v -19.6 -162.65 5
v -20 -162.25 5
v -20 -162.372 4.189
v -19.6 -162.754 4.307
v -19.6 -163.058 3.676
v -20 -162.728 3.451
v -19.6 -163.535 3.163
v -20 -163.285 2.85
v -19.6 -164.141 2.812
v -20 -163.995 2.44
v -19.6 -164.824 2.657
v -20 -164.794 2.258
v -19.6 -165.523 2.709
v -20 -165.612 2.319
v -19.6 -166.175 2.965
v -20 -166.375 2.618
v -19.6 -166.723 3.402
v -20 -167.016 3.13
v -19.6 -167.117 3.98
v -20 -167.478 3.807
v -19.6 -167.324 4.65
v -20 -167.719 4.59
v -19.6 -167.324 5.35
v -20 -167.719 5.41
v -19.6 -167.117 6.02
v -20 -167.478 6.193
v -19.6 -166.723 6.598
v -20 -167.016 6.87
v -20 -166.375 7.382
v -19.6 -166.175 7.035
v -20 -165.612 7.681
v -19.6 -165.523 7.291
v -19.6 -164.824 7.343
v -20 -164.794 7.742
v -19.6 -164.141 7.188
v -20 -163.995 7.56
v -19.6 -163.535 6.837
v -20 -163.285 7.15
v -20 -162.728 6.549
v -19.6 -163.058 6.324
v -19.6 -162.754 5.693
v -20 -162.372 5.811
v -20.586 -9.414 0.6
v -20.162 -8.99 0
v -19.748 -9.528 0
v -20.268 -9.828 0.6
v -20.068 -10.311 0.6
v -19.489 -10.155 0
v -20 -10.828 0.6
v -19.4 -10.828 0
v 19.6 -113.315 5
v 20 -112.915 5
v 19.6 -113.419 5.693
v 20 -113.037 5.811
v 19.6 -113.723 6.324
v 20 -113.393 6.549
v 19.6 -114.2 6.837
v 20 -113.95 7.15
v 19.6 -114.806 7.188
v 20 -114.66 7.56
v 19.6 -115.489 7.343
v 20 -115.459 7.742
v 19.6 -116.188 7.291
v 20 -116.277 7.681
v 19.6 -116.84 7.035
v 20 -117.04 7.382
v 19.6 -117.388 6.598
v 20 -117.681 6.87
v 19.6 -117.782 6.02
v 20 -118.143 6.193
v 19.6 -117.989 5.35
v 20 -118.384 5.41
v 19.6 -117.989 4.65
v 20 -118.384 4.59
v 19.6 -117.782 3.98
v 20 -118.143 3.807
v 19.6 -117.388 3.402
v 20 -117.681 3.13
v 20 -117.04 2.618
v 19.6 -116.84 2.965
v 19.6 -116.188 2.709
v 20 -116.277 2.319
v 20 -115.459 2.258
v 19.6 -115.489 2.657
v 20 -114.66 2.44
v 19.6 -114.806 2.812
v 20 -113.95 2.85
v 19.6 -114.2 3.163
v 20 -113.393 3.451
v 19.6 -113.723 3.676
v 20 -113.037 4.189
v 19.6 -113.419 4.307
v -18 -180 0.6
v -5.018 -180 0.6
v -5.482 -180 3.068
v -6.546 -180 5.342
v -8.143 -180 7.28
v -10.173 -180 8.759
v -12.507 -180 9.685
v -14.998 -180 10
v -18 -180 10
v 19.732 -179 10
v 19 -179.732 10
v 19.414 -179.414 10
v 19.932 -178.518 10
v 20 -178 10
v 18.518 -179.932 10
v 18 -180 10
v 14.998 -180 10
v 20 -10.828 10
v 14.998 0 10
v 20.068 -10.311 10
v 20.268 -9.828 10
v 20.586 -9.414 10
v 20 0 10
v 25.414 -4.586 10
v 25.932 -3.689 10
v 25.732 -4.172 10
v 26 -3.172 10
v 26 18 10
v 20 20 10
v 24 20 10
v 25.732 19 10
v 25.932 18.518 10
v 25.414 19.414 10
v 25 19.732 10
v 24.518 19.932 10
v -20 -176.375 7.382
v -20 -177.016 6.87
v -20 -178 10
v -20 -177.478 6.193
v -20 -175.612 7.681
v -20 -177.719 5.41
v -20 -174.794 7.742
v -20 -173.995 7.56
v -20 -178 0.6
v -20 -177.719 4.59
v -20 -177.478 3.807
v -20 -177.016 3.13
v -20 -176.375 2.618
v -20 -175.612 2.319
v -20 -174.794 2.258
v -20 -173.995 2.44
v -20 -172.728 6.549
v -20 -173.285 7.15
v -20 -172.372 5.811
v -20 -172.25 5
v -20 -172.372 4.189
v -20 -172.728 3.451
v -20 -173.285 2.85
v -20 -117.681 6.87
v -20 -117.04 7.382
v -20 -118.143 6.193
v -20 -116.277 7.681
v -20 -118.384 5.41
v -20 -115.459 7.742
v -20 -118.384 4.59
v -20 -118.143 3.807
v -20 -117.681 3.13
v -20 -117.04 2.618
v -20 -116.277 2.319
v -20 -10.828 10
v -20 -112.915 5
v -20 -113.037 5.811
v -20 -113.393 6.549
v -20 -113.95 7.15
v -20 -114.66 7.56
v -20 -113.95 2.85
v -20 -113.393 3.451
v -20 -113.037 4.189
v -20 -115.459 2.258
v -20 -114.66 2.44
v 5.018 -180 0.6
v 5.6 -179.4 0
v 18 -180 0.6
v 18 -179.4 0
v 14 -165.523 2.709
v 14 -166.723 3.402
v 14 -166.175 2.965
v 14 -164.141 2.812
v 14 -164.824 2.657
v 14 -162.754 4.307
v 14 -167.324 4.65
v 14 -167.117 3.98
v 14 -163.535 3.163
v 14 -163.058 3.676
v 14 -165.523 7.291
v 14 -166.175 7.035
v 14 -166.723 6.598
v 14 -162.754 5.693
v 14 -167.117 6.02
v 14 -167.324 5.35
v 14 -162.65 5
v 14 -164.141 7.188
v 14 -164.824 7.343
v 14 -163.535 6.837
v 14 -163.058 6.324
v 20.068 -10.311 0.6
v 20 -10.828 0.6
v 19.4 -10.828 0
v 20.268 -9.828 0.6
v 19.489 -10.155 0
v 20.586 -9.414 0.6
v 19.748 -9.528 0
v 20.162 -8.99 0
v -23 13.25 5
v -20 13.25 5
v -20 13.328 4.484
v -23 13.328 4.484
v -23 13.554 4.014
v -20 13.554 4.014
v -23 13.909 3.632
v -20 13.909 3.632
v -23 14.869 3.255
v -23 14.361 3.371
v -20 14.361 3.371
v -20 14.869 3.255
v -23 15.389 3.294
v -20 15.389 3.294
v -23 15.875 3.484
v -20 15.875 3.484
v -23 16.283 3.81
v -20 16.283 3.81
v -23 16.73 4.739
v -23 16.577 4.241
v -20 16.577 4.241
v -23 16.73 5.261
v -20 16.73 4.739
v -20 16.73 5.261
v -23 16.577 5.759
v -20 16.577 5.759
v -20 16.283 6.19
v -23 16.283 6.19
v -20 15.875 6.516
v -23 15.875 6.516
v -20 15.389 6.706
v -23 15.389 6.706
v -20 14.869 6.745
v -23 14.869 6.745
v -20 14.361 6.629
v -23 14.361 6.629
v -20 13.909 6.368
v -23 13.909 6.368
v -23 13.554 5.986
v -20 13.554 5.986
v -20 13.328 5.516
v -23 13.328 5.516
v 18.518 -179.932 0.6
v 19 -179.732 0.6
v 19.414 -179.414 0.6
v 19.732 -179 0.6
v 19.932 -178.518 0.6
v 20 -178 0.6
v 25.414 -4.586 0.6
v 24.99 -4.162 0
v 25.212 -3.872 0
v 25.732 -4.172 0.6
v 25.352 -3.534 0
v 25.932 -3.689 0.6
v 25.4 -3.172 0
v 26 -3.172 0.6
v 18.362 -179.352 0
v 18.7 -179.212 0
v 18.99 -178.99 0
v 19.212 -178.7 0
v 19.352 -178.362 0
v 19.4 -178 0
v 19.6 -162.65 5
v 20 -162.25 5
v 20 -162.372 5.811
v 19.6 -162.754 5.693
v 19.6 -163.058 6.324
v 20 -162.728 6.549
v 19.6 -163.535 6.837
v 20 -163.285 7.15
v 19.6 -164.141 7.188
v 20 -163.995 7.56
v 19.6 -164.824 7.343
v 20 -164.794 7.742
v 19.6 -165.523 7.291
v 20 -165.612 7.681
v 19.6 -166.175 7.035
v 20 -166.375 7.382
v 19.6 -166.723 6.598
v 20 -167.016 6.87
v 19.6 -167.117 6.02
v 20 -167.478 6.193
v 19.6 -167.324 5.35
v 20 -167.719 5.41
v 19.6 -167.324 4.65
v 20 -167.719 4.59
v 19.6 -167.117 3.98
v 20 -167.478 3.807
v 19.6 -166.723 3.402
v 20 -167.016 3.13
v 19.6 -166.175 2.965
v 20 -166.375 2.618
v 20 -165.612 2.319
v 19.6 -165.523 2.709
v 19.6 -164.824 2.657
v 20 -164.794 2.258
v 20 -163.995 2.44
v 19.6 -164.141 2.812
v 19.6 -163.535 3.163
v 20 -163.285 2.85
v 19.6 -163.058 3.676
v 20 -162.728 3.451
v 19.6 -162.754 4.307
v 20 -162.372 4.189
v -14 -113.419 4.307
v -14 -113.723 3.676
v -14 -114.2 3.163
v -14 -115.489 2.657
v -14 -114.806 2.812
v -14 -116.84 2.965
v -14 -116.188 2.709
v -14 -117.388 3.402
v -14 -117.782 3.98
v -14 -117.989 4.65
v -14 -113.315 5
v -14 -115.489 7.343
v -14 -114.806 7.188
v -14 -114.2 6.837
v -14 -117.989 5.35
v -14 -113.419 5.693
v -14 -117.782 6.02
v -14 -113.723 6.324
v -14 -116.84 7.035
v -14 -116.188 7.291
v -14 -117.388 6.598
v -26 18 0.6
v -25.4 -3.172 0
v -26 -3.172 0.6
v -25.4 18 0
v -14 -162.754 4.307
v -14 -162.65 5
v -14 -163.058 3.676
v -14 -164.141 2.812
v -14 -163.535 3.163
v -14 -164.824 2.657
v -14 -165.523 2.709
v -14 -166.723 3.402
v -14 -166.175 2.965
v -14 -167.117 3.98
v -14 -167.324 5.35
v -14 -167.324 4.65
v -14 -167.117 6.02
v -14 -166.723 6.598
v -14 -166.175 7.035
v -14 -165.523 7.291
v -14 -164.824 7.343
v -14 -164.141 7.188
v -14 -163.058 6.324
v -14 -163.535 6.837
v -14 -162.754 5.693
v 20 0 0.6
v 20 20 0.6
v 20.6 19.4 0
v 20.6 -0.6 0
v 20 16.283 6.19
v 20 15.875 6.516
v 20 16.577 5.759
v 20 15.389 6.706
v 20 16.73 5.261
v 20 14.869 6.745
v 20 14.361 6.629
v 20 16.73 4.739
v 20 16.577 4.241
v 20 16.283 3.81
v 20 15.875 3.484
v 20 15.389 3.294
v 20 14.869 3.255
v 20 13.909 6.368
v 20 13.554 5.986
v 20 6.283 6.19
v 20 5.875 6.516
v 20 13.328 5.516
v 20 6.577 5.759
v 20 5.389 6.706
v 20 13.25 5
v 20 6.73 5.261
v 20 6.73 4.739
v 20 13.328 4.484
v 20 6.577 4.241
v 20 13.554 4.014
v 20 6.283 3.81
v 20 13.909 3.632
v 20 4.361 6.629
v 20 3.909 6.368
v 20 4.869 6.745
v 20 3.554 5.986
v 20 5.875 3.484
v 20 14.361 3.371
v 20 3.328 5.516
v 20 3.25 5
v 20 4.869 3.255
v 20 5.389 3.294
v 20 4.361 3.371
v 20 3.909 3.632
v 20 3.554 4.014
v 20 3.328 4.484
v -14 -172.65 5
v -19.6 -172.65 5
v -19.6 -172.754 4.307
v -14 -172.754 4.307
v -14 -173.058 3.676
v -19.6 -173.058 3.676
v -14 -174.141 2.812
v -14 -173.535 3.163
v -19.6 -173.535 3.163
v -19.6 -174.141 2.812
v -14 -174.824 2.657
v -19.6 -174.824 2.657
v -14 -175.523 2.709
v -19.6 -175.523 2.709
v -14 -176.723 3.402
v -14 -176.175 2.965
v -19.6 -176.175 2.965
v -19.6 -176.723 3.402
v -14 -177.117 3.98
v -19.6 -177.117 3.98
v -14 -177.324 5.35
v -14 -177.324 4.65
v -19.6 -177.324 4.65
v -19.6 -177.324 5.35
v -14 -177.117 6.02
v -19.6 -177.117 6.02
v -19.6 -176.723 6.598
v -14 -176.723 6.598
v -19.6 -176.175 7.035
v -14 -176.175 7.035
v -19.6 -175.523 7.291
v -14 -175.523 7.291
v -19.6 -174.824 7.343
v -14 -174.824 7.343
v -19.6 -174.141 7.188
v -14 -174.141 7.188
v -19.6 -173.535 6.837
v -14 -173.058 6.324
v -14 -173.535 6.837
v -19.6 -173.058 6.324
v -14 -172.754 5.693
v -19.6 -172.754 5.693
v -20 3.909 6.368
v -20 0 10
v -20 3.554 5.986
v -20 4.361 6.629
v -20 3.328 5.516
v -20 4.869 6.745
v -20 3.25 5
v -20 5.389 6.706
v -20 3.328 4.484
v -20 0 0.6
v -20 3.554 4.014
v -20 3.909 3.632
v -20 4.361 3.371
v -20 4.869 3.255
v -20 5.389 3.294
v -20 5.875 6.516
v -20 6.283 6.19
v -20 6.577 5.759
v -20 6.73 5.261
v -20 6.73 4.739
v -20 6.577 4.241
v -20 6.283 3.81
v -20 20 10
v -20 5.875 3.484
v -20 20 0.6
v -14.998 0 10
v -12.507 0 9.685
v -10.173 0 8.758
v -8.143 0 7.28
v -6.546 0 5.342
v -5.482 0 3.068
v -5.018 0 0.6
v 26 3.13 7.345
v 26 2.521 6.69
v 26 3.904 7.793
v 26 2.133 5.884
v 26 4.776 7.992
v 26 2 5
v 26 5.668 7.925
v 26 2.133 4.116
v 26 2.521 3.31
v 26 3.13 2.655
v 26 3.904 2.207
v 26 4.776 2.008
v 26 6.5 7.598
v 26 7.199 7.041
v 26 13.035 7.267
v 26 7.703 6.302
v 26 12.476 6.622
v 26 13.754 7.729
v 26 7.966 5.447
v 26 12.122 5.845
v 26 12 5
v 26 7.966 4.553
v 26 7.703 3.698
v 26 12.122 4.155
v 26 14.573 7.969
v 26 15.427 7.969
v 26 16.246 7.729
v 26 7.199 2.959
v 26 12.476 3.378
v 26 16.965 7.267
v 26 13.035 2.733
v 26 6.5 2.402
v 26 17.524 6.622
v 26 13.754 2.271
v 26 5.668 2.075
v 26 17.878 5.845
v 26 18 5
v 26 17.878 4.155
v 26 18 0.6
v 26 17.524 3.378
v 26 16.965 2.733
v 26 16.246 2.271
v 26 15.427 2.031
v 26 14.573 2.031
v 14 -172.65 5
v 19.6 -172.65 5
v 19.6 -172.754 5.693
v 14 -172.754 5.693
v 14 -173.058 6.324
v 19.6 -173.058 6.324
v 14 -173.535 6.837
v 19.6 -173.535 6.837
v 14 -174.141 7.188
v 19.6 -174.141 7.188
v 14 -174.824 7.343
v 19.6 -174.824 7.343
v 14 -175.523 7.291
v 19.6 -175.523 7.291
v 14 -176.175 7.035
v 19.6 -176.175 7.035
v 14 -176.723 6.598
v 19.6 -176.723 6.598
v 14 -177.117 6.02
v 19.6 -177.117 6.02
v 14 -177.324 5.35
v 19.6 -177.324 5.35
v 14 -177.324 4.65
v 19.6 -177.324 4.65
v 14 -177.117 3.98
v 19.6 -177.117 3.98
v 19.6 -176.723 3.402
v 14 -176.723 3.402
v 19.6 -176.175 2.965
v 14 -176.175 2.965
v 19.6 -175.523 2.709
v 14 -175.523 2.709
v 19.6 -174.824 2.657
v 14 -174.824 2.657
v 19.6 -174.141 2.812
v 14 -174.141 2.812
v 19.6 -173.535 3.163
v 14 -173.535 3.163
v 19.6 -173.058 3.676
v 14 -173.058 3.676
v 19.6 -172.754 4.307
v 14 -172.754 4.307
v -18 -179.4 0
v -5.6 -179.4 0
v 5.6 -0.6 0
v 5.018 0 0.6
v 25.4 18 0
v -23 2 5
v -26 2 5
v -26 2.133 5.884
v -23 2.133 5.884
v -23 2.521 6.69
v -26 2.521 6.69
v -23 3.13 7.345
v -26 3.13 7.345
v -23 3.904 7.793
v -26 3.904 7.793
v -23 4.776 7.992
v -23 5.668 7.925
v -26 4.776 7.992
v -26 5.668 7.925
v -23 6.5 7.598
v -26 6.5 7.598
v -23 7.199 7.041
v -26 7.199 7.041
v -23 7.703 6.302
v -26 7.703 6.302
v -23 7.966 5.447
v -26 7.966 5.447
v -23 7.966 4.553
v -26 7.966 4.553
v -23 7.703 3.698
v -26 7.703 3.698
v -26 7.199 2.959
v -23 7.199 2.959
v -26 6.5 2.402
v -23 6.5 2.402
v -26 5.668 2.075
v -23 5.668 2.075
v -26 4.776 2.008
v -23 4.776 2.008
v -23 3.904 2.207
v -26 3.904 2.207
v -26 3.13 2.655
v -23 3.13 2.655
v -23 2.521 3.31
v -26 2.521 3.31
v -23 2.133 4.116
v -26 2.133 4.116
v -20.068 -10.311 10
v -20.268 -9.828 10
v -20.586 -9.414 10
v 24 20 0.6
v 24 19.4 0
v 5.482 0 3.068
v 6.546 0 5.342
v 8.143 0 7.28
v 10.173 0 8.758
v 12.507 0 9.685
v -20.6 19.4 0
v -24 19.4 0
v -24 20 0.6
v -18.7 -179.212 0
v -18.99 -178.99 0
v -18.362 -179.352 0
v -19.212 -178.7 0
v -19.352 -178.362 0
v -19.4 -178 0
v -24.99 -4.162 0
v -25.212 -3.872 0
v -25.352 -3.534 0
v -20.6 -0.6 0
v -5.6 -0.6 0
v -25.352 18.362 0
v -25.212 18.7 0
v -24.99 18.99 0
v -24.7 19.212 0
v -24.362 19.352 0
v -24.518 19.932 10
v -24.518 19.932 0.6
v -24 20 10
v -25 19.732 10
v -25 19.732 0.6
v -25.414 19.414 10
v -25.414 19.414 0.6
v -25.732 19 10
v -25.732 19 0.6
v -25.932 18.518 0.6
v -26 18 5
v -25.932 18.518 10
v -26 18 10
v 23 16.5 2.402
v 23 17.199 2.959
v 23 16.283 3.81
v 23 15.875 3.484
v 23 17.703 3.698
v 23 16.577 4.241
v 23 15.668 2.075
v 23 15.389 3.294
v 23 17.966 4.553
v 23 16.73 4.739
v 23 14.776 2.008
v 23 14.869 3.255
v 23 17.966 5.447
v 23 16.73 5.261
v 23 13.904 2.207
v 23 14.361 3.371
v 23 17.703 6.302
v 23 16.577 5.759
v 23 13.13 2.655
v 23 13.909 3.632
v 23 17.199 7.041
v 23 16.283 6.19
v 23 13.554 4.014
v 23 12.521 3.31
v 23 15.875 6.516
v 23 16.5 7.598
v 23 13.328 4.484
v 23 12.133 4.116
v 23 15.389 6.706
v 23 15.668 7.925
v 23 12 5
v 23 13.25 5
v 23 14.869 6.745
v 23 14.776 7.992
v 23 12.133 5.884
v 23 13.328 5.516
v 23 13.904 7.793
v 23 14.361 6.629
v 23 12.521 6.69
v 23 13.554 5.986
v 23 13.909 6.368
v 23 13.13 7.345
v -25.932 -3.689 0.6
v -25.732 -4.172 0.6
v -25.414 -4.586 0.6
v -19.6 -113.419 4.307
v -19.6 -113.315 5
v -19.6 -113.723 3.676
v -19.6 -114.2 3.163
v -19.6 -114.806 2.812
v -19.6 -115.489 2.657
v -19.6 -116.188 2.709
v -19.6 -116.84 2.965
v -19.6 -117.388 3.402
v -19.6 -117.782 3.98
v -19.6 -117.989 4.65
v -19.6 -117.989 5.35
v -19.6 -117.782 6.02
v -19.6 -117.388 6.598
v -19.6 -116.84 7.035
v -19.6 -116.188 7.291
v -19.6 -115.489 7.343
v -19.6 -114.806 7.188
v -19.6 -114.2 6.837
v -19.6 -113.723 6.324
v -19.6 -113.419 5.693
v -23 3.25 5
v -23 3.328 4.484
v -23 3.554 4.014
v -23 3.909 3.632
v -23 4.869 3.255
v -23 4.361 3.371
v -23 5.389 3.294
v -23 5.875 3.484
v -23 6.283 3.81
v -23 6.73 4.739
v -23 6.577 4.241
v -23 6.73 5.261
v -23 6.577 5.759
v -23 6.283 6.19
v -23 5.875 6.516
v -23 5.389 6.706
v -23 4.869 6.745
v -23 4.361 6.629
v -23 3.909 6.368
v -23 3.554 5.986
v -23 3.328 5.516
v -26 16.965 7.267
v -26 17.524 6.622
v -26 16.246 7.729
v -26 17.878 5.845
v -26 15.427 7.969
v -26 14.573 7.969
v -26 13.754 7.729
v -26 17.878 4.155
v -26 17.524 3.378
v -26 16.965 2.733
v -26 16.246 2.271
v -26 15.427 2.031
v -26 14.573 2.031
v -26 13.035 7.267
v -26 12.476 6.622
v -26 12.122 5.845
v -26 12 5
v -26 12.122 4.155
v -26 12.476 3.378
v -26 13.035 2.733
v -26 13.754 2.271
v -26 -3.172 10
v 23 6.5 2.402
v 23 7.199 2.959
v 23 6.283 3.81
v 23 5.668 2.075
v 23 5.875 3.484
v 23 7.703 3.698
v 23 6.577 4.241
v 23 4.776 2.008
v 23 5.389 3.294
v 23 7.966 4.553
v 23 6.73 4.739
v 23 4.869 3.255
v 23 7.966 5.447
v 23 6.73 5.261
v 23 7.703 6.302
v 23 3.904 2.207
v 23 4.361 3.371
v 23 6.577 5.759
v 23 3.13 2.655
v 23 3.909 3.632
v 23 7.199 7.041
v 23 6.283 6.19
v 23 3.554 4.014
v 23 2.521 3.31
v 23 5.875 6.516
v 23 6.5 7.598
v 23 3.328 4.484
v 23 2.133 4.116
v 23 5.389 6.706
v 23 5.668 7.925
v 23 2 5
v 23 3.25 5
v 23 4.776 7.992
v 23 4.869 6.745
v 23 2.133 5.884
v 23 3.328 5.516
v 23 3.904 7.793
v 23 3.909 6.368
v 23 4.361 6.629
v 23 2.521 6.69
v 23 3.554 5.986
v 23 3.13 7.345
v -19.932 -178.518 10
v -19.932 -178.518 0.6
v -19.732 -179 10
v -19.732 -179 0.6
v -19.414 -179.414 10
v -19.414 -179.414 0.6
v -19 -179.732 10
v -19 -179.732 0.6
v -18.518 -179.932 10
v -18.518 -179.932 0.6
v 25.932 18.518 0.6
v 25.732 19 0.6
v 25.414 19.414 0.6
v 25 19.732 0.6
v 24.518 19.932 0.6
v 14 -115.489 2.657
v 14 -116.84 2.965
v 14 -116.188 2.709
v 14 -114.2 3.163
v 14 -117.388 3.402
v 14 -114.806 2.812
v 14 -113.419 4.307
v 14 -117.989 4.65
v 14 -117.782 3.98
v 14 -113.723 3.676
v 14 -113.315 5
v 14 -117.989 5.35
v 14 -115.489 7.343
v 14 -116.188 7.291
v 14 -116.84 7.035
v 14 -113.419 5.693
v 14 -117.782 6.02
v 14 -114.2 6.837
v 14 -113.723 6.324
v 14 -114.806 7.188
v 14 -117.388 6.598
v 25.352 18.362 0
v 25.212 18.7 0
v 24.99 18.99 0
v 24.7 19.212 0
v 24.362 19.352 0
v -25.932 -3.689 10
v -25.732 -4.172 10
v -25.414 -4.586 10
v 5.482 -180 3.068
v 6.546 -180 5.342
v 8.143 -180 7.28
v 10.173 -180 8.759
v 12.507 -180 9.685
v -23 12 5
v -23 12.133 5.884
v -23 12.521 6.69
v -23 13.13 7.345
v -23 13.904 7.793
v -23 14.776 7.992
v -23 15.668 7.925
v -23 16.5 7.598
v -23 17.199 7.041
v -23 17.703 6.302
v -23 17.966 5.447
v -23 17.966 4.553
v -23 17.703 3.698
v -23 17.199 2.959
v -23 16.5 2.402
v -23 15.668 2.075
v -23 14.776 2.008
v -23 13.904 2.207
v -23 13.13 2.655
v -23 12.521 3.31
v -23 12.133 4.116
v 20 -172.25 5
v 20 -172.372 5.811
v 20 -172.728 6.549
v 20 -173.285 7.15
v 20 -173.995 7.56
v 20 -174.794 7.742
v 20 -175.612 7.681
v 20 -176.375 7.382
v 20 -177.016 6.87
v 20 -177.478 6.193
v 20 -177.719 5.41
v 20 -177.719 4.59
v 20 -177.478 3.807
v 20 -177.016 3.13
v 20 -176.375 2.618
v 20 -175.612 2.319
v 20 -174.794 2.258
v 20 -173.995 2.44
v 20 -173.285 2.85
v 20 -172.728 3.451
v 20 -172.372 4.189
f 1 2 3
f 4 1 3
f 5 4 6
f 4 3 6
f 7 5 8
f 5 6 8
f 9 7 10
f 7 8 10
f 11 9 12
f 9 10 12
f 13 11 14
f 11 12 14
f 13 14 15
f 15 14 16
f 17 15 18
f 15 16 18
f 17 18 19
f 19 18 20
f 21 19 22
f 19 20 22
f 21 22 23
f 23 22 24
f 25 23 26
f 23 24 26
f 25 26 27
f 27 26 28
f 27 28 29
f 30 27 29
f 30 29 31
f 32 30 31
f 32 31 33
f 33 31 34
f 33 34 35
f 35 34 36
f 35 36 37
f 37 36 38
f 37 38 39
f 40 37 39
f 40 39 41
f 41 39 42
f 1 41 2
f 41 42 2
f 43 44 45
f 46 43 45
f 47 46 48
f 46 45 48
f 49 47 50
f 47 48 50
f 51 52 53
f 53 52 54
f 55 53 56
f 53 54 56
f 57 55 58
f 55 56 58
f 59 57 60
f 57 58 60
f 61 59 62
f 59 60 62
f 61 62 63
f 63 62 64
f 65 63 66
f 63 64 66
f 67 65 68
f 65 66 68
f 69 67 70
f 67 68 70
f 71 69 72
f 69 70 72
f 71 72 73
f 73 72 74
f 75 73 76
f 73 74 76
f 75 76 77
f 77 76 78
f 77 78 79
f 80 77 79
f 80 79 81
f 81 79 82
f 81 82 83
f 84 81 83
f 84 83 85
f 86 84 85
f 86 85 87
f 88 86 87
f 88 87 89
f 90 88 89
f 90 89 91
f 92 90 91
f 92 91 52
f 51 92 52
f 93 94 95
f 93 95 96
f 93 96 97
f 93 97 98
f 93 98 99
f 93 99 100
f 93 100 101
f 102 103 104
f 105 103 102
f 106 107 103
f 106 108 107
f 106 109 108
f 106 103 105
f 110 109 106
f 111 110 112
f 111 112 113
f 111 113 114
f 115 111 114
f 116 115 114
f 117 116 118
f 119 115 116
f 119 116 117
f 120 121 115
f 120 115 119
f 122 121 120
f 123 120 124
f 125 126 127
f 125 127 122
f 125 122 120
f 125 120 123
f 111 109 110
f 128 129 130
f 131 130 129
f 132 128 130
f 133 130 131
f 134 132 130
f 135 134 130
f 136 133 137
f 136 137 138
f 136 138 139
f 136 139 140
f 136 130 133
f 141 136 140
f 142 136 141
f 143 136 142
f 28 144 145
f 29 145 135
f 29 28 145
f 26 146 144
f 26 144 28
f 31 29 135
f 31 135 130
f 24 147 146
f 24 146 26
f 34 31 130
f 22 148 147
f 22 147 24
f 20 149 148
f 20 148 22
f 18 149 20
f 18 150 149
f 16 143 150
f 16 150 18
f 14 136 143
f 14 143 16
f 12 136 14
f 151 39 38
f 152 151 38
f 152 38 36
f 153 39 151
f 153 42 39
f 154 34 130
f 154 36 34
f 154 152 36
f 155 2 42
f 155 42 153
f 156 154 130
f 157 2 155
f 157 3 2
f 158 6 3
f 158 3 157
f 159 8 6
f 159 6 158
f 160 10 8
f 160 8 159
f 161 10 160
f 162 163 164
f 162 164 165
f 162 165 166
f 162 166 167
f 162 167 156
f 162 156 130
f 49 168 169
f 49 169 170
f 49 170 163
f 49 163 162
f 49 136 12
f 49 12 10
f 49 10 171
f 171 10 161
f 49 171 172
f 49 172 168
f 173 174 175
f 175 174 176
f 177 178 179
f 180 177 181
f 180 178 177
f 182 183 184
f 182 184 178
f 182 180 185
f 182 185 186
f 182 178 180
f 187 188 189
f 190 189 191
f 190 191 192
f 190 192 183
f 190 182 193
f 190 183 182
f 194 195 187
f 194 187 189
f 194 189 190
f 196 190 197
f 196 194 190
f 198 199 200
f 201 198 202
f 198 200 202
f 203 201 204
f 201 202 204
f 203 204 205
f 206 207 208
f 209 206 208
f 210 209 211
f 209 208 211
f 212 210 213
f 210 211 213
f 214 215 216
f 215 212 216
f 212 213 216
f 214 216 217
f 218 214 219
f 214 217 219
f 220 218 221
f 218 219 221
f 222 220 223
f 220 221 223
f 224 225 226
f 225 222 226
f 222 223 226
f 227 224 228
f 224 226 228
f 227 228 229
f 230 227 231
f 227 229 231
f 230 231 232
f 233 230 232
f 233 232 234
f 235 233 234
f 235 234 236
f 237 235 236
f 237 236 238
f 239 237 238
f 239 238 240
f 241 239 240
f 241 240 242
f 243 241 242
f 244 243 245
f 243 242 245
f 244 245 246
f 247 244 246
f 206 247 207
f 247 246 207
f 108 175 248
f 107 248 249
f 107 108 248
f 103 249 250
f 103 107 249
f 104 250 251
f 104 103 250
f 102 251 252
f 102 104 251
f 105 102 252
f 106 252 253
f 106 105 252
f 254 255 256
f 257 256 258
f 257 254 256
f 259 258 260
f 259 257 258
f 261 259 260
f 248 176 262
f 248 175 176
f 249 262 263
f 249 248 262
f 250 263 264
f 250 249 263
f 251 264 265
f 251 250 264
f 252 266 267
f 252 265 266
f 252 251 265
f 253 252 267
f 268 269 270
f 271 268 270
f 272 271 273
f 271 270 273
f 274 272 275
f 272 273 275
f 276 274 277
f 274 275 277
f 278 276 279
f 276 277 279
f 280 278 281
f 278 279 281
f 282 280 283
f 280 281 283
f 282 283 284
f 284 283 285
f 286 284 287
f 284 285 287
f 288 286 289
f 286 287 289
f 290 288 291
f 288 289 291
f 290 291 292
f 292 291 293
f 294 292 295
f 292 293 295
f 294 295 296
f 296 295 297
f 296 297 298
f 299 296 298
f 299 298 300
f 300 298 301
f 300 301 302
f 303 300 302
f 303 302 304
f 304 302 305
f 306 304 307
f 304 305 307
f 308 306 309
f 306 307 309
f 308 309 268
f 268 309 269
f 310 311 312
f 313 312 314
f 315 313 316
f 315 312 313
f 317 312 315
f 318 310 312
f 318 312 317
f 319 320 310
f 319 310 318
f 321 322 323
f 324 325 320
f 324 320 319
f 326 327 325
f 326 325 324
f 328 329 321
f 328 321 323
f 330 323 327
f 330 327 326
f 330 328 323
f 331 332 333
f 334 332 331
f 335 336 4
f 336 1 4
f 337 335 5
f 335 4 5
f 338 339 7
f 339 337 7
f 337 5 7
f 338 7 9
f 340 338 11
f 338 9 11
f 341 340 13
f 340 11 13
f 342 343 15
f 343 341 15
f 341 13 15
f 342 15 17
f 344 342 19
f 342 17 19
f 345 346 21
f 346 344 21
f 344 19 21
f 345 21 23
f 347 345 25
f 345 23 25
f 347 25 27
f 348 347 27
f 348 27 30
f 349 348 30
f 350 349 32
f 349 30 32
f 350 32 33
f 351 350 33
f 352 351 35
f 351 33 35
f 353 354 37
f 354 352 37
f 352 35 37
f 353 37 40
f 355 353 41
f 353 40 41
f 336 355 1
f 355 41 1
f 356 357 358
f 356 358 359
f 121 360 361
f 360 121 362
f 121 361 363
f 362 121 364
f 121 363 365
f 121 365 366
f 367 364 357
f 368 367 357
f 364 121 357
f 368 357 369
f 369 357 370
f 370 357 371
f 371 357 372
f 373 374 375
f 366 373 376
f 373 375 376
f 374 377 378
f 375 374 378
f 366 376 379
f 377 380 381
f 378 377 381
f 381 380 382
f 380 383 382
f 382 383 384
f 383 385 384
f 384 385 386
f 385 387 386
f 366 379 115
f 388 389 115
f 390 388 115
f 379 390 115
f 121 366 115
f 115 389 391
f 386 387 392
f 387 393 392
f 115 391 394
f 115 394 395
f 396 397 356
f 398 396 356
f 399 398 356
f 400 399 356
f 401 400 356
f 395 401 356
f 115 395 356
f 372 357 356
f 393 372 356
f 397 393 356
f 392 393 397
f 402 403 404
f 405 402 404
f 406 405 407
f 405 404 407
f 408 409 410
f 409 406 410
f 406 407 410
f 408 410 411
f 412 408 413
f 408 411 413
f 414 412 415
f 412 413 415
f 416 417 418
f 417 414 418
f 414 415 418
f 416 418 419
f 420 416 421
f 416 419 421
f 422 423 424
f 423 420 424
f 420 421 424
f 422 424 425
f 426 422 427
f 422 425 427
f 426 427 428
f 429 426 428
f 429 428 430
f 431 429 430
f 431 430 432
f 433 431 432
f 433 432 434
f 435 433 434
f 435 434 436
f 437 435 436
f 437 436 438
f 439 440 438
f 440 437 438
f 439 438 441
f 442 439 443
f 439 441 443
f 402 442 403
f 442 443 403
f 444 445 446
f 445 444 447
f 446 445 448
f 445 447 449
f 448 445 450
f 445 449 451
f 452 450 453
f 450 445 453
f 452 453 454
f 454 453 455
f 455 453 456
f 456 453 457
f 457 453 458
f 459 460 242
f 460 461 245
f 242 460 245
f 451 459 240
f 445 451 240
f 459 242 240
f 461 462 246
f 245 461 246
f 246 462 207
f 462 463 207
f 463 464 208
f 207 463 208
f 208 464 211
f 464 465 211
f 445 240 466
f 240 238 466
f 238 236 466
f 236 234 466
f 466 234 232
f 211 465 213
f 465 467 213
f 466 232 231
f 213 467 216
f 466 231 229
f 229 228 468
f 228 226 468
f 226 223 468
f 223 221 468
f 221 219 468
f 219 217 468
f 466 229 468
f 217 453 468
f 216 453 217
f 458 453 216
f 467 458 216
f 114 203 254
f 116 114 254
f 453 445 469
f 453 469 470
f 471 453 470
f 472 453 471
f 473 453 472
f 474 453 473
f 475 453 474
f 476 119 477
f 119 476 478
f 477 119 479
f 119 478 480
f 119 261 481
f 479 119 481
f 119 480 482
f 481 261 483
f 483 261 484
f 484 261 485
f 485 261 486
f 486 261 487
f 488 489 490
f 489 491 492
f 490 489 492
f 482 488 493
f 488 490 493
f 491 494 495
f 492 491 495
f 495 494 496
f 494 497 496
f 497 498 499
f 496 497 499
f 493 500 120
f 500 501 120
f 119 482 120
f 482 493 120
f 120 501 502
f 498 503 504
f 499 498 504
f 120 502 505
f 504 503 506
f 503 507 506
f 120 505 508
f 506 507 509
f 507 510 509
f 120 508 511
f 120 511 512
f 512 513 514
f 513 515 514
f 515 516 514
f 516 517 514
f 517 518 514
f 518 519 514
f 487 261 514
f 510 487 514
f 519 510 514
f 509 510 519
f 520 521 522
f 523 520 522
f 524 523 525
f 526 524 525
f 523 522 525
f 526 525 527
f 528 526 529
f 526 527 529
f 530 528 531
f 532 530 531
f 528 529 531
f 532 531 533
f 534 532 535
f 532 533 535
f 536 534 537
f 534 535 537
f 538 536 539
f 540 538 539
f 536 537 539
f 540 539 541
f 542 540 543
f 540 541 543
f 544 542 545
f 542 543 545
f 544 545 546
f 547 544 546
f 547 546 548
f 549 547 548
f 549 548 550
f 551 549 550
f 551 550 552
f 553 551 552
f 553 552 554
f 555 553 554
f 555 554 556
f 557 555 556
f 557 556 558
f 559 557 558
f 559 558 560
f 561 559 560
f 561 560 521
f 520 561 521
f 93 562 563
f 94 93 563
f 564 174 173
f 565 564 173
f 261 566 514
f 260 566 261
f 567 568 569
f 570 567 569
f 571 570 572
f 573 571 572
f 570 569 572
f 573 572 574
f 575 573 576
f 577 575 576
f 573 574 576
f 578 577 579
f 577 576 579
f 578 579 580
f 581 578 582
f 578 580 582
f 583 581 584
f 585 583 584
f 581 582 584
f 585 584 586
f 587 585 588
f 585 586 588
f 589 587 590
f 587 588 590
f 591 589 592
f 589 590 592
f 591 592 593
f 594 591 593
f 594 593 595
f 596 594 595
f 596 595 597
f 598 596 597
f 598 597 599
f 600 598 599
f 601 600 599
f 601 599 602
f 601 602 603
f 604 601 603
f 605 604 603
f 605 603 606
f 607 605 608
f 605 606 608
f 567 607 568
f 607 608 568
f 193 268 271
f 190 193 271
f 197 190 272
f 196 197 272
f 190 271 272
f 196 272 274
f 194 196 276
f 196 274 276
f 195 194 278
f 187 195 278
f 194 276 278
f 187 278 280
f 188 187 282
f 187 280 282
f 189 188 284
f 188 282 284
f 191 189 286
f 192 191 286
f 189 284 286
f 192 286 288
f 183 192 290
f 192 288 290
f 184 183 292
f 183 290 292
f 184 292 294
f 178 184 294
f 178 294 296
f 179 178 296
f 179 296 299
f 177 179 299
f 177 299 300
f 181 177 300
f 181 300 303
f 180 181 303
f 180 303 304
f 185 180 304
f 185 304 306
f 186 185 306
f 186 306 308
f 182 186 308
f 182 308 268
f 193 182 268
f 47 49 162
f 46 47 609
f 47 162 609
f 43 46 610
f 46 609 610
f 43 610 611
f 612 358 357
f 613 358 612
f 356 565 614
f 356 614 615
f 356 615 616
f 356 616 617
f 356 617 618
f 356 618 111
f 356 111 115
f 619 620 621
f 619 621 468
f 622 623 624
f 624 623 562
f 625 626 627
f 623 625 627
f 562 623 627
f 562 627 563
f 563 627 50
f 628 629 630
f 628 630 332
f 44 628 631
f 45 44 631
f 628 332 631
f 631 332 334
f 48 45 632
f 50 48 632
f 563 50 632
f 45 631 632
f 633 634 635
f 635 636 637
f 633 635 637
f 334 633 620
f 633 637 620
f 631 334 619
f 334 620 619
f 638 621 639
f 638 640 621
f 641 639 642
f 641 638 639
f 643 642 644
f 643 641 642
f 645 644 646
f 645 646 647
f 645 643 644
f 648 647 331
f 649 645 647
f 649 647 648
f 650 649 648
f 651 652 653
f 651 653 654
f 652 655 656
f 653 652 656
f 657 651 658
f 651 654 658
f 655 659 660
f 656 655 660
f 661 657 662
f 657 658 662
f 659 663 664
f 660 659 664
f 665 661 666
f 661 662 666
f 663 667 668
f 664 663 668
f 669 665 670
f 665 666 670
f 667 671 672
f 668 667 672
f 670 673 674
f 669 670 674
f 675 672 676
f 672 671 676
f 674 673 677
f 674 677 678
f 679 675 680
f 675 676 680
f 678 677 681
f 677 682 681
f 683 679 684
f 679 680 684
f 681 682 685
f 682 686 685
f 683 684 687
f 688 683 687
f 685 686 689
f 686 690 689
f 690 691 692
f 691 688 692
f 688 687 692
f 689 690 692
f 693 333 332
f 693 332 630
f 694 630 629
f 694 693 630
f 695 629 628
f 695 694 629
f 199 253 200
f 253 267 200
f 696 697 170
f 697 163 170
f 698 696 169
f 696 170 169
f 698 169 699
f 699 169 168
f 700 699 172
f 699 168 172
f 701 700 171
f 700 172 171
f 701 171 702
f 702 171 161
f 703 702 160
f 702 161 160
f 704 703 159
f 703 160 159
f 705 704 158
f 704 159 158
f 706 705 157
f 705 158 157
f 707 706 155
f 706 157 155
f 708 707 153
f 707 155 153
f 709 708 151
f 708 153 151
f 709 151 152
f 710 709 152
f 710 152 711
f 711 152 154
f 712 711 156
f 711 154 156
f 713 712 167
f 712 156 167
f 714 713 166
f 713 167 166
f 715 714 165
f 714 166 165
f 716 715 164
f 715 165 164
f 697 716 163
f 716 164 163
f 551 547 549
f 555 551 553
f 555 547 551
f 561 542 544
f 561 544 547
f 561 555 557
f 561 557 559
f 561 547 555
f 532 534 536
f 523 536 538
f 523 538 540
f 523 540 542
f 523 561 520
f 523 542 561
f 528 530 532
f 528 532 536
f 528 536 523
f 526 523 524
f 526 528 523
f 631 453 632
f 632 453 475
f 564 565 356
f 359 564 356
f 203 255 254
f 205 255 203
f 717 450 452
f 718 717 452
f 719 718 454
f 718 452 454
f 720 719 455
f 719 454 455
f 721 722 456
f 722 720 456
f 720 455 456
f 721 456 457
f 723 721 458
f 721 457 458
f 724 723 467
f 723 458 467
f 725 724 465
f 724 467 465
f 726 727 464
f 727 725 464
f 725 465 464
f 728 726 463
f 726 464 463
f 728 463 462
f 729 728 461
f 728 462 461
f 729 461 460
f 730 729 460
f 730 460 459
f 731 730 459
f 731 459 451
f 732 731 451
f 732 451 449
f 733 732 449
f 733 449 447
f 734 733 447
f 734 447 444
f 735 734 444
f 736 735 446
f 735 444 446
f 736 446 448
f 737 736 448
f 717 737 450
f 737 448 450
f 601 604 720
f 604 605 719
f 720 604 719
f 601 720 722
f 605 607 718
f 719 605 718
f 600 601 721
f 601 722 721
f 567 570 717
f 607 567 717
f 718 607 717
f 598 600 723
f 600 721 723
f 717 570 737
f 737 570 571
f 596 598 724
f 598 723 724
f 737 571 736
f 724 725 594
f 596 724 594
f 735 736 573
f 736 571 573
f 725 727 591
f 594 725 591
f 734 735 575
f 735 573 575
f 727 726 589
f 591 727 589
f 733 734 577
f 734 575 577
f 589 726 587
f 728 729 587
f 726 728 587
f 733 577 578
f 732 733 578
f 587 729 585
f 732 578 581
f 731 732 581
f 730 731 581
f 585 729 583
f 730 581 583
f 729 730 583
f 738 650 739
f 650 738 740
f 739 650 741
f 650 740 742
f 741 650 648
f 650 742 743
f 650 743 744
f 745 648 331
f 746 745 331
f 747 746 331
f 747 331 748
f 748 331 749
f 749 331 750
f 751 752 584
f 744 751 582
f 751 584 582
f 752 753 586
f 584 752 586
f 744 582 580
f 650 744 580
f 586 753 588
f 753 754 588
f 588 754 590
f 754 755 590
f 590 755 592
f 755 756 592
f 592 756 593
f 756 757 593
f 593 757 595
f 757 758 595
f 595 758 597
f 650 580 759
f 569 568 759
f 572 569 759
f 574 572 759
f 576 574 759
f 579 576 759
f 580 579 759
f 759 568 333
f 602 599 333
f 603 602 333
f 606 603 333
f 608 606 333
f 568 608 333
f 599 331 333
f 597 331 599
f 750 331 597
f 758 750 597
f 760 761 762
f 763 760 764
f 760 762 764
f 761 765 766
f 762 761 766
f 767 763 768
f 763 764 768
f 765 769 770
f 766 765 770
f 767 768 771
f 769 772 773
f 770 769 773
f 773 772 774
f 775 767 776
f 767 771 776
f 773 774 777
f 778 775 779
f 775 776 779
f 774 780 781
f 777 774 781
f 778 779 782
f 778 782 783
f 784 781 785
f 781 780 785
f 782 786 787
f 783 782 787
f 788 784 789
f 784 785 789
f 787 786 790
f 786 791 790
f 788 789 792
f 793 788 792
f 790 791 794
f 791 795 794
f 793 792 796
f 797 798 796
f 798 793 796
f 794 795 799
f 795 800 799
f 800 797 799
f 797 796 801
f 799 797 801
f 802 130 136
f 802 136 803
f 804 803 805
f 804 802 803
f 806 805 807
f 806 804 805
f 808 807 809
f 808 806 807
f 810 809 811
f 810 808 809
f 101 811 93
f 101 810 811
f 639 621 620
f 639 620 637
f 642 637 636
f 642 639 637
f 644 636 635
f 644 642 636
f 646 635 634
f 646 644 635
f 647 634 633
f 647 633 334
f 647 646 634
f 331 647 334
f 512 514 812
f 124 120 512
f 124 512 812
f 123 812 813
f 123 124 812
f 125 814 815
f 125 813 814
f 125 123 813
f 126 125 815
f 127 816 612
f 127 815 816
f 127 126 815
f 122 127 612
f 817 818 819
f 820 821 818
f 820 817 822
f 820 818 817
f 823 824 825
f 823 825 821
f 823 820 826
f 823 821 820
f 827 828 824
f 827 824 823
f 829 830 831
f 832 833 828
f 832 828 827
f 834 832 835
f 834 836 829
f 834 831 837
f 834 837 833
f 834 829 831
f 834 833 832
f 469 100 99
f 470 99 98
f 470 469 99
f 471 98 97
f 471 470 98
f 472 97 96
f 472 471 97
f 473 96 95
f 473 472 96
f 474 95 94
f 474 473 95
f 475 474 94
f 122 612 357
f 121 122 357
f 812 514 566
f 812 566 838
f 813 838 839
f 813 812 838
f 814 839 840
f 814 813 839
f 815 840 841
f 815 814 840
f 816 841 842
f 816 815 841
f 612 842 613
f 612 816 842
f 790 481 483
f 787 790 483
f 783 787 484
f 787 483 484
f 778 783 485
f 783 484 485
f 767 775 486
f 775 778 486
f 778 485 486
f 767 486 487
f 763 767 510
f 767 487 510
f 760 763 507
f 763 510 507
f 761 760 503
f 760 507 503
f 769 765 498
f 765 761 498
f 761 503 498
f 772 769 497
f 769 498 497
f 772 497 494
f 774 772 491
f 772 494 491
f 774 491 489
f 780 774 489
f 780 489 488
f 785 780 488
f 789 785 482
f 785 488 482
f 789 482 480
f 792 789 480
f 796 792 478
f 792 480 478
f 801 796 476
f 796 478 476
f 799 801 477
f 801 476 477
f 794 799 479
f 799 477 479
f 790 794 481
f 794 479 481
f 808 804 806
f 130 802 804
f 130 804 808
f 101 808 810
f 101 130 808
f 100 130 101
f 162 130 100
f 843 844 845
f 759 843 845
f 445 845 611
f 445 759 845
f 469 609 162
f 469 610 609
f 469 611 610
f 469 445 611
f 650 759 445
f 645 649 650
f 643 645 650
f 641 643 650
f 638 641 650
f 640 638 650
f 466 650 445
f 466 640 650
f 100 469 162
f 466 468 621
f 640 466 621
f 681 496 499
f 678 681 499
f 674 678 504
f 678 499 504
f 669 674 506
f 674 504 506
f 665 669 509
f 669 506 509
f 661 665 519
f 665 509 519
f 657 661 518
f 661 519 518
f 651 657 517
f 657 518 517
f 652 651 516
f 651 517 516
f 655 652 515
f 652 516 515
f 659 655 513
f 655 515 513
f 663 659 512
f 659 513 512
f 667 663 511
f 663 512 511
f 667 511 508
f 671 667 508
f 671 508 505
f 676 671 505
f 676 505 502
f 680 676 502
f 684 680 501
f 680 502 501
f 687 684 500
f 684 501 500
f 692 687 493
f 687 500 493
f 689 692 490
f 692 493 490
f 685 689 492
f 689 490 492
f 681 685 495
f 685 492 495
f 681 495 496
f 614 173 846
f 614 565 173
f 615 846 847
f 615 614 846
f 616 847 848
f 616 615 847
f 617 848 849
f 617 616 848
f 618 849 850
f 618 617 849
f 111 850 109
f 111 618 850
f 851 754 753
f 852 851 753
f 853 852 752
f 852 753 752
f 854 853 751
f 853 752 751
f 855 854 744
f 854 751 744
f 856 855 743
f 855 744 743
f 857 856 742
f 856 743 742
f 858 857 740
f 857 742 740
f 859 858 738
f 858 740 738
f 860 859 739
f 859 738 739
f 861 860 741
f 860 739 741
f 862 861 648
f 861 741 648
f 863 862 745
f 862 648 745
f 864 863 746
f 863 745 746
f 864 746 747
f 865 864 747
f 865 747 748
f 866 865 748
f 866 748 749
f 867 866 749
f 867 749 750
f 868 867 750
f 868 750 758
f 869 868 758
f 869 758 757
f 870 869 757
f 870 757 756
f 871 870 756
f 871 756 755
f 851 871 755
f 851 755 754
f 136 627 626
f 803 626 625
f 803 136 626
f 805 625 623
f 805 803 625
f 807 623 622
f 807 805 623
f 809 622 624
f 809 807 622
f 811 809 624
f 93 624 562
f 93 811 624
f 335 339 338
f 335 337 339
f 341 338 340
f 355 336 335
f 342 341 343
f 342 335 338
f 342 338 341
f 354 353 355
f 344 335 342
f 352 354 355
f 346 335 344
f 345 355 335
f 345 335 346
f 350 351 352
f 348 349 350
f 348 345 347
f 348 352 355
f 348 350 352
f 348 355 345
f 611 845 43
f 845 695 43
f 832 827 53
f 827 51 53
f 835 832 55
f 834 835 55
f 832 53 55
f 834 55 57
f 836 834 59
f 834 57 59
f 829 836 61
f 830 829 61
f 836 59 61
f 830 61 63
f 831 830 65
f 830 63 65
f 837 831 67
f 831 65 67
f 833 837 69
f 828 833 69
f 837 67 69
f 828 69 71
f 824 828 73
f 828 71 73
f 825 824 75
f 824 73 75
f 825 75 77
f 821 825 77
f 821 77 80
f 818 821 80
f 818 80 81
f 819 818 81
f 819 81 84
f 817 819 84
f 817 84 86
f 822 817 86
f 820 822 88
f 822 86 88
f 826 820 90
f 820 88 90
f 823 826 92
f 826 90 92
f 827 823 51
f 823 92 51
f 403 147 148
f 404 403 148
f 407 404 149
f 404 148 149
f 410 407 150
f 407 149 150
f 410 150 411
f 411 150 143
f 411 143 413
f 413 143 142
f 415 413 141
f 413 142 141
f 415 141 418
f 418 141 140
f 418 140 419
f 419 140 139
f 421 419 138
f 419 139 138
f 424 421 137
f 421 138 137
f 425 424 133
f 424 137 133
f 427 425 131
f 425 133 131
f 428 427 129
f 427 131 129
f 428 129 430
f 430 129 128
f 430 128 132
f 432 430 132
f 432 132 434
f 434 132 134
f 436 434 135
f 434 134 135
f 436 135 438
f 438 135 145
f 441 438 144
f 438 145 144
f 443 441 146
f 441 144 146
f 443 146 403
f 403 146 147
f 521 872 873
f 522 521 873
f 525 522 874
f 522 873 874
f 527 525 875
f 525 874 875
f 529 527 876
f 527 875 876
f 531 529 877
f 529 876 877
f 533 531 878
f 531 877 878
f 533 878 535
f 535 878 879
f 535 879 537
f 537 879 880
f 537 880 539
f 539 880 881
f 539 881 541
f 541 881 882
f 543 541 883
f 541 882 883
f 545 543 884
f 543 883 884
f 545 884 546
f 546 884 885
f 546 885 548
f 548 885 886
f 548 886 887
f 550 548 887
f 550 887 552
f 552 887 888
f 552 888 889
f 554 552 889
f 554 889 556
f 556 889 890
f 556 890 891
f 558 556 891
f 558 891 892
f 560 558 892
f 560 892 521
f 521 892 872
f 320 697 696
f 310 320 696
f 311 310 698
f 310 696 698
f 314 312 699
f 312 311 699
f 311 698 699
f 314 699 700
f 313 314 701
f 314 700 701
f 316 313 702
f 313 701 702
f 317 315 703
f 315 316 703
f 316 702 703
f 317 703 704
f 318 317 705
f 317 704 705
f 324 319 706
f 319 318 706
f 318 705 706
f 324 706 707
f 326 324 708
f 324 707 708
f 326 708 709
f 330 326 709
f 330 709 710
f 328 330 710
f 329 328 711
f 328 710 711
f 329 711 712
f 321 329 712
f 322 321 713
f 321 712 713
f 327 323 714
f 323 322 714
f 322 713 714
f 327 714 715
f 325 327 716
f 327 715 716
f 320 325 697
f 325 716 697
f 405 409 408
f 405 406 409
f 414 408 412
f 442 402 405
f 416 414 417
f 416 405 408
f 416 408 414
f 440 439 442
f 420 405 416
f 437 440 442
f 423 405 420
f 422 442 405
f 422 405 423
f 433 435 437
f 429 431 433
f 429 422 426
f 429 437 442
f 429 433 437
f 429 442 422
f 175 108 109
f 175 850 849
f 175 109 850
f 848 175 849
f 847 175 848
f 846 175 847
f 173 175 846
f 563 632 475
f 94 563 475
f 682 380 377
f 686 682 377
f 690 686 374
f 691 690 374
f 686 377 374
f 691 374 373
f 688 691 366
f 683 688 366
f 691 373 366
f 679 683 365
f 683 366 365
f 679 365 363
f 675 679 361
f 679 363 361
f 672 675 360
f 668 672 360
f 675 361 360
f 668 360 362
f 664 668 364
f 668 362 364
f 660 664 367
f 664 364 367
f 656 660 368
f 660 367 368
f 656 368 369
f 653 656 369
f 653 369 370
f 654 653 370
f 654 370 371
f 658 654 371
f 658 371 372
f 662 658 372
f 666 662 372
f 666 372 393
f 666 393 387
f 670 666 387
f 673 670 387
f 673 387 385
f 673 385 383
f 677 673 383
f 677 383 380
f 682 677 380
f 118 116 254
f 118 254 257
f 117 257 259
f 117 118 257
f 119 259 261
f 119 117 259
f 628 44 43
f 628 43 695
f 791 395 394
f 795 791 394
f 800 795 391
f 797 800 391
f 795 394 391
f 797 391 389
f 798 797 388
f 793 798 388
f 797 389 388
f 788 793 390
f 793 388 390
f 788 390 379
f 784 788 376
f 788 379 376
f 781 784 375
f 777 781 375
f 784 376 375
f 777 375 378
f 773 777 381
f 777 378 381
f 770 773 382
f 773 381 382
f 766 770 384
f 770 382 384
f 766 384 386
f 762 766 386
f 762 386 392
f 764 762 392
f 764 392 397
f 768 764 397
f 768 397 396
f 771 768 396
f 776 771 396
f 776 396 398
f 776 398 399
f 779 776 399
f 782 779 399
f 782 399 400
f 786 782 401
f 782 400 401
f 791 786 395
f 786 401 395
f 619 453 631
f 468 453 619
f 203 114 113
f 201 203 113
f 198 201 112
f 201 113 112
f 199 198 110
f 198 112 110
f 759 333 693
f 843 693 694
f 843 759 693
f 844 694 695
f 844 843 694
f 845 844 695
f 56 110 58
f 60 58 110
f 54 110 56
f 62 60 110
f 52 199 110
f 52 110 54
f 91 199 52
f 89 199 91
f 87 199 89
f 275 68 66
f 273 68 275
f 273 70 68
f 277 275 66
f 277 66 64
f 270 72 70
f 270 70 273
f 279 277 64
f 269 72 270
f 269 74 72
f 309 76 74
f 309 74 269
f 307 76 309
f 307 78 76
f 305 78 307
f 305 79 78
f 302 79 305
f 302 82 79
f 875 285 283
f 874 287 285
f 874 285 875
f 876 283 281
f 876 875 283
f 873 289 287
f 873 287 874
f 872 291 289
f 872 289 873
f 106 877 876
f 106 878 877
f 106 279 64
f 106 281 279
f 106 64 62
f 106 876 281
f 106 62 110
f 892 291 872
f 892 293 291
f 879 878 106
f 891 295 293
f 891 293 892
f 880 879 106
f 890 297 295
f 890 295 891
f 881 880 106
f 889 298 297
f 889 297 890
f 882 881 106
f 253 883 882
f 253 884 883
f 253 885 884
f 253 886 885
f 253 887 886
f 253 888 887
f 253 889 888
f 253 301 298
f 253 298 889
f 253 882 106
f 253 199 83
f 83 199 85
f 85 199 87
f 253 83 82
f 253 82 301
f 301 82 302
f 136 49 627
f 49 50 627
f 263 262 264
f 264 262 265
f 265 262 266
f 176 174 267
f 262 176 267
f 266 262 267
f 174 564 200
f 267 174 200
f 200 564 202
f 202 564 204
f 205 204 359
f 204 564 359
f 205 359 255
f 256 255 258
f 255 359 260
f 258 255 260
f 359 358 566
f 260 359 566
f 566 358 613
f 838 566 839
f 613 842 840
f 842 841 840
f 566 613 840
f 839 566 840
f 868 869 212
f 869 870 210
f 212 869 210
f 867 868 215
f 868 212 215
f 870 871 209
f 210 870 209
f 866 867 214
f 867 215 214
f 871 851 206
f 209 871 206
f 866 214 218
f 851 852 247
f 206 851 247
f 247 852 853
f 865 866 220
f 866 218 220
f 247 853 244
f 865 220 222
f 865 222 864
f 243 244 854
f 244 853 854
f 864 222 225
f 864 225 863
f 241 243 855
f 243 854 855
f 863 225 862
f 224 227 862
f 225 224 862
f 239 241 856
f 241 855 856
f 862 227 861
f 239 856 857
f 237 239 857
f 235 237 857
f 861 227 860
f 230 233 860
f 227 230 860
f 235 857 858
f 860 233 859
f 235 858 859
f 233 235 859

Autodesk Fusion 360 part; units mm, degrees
sketch "Sketch1" plane through (0, 0, 0) normal (0, 0, 1) x (1, 0, 0)
  line L0 (5, 0) -> (20, 0)
  line L1 (20, 0) -> (20, -180)
  line L2 (20, -180) -> (5, -180)
  line L3 (5, -180) -> (5, 0)
  line L4 (20, -10) -> (26, -4)
  line L5 (20, -10) -> (30.8245, -10) construction
  line L6 (26, -4) -> (26, 20)
  line L7 (26, 20) -> (20, 20)
  line L8 (20, 20) -> (20, 0)
  line L9 (0, 0) -> (5, 0) construction
  dimension "d1" = 15
  dimension "d2" = 180
  dimension "d3" = 45
  dimension "d4" = 10
  dimension "d5" = 200
  dimension "d6" = 6
  dimension "d31" = 5
extrude "Extrude1" add sketch "Sketch1" along normal blind 10 makes body 1
sketch "Sketch2" plane through (20, 0, 0) normal (-1, 0, 0) x (0, -1, 0)
  line L0 (-20, 0) -> (0, 0)
  line L1 (0, 0) -> (0, 10)
  line L2 (0, 10) -> (-20, 10)
  line L3 (-20, 10) -> (-20, 0)
  circle A0 centre (-15, 5) radius 1.75
  circle A1 centre (-15, 5) radius 3
  line L4 (-20, 5) -> (0, 5) construction
  line L5 (-10, 5) -> (-10, 10) construction
  circle A2 centre (-5, 5) radius 1.75
  circle A3 centre (-5, 5) radius 3
  line L6 (0, 0) -> (0, 10) construction
  dimension "d9" = 3.5
  dimension "d10" = 6
  dimension "d11" = 5
extrude "Extrude2" cut sketch "Sketch2" against normal up to surface (6 mm away) contours A0 | A2 bodies 1
extrude "Extrude3" cut sketch "Sketch2" along normal blind 3 from surface at -6 contours A1 | A3 bodies 1
sketch "Sketch3" plane through (20, 0, 0) normal (1, 0, 0) x (0, 1, 0)
  line L0 (-180, 0) -> (-10, 0)
  line L1 (-10, 0) -> (-10, 10)
  line L2 (-10, 10) -> (-180, 10)
  line L3 (-180, 10) -> (-180, 0)
  line L4 (-180, 5) -> (-93.8269, 5) construction
  circle A0 centre (-175, 5) radius 2.35
  circle A1 centre (-165, 5) radius 2.35
  circle A2 centre (-115.665, 5) radius 2.35
  dimension "d17" = 4.7
  dimension "d18" = 4.7
  dimension "d19" = 10
  dimension "d20" = 5
  dimension "d23" = 4.7
  dimension "d24" = 64.335
extrude "Extrude4" cut sketch "Sketch3" against normal blind 6 contours A0 | A1 | A2 bodies 1
fillet "Fillet1" radius 10 1 edges at (5, -90, 10) on bodies 1
fillet "Fillet2" radius 2 3 edges at (20, -10, 5) (26, -4, 5) (26, 20, 5) on bodies 1
chamfer "Chamfer1" distance 0.4 angle 45 3 edges at (20, -177.191, 5.8498) (20, -167.191, 5.8498) (20, -117.856, 5.8498) on bodies 1
fillet "Fillet3" radius 2 1 edges at (20, -180, 5) on bodies 1
chamfer "Chamfer2" distance 0.6 angle 45 1 faces at (10, -63.6095, 0) on bodies 1
mirror "Mirror1" about plane through (0, 0, 0) normal (1, 0, 0) of bodies 1 makes body 2
